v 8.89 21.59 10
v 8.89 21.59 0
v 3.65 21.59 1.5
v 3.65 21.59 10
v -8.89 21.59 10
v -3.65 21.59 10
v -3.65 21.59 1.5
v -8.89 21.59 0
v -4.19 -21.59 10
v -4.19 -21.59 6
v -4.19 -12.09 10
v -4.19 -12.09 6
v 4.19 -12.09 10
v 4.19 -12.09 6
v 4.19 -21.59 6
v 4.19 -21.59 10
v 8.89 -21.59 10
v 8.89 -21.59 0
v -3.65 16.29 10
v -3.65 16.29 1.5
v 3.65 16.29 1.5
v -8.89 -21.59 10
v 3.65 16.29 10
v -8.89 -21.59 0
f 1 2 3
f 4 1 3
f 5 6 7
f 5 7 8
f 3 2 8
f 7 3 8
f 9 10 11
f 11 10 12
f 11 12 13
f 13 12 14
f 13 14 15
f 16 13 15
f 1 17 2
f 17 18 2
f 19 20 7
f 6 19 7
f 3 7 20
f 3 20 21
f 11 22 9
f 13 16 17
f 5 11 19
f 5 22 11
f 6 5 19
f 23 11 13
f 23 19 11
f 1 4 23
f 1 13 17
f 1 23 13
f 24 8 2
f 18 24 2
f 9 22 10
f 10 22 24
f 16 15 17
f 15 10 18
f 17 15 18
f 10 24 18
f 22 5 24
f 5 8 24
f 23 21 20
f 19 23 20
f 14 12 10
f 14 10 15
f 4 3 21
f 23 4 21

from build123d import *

# Parameters (mm, degrees)
F0_W     = 17.78
F0_H     = 43.18
F1_DEPTH = 1.5
F3_DEPTH = 8.5
F4_DEPTH = 4.5


with BuildPart() as f1:
    # F0 (on Top) → F1 (new body)
    with BuildSketch(Plane.XY):
        Rectangle(F0_W, F0_H)
    extrude(amount=F1_DEPTH)

    # F2 (on face) → F3 (join)
    with BuildSketch(Plane.XY.offset(1.5)):
        Polygon((-3.65, 16.29), (-3.65, 21.59), (-8.89, 21.59), (-8.89, -21.59), (-4.19, -21.59), (-4.19, -12.09), (4.19, -12.09), (4.19, -21.59), (8.89, -21.59), (8.89, 21.59), (3.65, 21.59), (3.65, 16.29), align=None)
    extrude(amount=F3_DEPTH)

    # F4 (add): a face of the model
    f4_faces = [f1.faces().sort_by_distance(p)[0] for p in [
        (0, -16.84, 1.5),
    ]]
    extrude(f4_faces, amount=F4_DEPTH)


solid = f1.part
